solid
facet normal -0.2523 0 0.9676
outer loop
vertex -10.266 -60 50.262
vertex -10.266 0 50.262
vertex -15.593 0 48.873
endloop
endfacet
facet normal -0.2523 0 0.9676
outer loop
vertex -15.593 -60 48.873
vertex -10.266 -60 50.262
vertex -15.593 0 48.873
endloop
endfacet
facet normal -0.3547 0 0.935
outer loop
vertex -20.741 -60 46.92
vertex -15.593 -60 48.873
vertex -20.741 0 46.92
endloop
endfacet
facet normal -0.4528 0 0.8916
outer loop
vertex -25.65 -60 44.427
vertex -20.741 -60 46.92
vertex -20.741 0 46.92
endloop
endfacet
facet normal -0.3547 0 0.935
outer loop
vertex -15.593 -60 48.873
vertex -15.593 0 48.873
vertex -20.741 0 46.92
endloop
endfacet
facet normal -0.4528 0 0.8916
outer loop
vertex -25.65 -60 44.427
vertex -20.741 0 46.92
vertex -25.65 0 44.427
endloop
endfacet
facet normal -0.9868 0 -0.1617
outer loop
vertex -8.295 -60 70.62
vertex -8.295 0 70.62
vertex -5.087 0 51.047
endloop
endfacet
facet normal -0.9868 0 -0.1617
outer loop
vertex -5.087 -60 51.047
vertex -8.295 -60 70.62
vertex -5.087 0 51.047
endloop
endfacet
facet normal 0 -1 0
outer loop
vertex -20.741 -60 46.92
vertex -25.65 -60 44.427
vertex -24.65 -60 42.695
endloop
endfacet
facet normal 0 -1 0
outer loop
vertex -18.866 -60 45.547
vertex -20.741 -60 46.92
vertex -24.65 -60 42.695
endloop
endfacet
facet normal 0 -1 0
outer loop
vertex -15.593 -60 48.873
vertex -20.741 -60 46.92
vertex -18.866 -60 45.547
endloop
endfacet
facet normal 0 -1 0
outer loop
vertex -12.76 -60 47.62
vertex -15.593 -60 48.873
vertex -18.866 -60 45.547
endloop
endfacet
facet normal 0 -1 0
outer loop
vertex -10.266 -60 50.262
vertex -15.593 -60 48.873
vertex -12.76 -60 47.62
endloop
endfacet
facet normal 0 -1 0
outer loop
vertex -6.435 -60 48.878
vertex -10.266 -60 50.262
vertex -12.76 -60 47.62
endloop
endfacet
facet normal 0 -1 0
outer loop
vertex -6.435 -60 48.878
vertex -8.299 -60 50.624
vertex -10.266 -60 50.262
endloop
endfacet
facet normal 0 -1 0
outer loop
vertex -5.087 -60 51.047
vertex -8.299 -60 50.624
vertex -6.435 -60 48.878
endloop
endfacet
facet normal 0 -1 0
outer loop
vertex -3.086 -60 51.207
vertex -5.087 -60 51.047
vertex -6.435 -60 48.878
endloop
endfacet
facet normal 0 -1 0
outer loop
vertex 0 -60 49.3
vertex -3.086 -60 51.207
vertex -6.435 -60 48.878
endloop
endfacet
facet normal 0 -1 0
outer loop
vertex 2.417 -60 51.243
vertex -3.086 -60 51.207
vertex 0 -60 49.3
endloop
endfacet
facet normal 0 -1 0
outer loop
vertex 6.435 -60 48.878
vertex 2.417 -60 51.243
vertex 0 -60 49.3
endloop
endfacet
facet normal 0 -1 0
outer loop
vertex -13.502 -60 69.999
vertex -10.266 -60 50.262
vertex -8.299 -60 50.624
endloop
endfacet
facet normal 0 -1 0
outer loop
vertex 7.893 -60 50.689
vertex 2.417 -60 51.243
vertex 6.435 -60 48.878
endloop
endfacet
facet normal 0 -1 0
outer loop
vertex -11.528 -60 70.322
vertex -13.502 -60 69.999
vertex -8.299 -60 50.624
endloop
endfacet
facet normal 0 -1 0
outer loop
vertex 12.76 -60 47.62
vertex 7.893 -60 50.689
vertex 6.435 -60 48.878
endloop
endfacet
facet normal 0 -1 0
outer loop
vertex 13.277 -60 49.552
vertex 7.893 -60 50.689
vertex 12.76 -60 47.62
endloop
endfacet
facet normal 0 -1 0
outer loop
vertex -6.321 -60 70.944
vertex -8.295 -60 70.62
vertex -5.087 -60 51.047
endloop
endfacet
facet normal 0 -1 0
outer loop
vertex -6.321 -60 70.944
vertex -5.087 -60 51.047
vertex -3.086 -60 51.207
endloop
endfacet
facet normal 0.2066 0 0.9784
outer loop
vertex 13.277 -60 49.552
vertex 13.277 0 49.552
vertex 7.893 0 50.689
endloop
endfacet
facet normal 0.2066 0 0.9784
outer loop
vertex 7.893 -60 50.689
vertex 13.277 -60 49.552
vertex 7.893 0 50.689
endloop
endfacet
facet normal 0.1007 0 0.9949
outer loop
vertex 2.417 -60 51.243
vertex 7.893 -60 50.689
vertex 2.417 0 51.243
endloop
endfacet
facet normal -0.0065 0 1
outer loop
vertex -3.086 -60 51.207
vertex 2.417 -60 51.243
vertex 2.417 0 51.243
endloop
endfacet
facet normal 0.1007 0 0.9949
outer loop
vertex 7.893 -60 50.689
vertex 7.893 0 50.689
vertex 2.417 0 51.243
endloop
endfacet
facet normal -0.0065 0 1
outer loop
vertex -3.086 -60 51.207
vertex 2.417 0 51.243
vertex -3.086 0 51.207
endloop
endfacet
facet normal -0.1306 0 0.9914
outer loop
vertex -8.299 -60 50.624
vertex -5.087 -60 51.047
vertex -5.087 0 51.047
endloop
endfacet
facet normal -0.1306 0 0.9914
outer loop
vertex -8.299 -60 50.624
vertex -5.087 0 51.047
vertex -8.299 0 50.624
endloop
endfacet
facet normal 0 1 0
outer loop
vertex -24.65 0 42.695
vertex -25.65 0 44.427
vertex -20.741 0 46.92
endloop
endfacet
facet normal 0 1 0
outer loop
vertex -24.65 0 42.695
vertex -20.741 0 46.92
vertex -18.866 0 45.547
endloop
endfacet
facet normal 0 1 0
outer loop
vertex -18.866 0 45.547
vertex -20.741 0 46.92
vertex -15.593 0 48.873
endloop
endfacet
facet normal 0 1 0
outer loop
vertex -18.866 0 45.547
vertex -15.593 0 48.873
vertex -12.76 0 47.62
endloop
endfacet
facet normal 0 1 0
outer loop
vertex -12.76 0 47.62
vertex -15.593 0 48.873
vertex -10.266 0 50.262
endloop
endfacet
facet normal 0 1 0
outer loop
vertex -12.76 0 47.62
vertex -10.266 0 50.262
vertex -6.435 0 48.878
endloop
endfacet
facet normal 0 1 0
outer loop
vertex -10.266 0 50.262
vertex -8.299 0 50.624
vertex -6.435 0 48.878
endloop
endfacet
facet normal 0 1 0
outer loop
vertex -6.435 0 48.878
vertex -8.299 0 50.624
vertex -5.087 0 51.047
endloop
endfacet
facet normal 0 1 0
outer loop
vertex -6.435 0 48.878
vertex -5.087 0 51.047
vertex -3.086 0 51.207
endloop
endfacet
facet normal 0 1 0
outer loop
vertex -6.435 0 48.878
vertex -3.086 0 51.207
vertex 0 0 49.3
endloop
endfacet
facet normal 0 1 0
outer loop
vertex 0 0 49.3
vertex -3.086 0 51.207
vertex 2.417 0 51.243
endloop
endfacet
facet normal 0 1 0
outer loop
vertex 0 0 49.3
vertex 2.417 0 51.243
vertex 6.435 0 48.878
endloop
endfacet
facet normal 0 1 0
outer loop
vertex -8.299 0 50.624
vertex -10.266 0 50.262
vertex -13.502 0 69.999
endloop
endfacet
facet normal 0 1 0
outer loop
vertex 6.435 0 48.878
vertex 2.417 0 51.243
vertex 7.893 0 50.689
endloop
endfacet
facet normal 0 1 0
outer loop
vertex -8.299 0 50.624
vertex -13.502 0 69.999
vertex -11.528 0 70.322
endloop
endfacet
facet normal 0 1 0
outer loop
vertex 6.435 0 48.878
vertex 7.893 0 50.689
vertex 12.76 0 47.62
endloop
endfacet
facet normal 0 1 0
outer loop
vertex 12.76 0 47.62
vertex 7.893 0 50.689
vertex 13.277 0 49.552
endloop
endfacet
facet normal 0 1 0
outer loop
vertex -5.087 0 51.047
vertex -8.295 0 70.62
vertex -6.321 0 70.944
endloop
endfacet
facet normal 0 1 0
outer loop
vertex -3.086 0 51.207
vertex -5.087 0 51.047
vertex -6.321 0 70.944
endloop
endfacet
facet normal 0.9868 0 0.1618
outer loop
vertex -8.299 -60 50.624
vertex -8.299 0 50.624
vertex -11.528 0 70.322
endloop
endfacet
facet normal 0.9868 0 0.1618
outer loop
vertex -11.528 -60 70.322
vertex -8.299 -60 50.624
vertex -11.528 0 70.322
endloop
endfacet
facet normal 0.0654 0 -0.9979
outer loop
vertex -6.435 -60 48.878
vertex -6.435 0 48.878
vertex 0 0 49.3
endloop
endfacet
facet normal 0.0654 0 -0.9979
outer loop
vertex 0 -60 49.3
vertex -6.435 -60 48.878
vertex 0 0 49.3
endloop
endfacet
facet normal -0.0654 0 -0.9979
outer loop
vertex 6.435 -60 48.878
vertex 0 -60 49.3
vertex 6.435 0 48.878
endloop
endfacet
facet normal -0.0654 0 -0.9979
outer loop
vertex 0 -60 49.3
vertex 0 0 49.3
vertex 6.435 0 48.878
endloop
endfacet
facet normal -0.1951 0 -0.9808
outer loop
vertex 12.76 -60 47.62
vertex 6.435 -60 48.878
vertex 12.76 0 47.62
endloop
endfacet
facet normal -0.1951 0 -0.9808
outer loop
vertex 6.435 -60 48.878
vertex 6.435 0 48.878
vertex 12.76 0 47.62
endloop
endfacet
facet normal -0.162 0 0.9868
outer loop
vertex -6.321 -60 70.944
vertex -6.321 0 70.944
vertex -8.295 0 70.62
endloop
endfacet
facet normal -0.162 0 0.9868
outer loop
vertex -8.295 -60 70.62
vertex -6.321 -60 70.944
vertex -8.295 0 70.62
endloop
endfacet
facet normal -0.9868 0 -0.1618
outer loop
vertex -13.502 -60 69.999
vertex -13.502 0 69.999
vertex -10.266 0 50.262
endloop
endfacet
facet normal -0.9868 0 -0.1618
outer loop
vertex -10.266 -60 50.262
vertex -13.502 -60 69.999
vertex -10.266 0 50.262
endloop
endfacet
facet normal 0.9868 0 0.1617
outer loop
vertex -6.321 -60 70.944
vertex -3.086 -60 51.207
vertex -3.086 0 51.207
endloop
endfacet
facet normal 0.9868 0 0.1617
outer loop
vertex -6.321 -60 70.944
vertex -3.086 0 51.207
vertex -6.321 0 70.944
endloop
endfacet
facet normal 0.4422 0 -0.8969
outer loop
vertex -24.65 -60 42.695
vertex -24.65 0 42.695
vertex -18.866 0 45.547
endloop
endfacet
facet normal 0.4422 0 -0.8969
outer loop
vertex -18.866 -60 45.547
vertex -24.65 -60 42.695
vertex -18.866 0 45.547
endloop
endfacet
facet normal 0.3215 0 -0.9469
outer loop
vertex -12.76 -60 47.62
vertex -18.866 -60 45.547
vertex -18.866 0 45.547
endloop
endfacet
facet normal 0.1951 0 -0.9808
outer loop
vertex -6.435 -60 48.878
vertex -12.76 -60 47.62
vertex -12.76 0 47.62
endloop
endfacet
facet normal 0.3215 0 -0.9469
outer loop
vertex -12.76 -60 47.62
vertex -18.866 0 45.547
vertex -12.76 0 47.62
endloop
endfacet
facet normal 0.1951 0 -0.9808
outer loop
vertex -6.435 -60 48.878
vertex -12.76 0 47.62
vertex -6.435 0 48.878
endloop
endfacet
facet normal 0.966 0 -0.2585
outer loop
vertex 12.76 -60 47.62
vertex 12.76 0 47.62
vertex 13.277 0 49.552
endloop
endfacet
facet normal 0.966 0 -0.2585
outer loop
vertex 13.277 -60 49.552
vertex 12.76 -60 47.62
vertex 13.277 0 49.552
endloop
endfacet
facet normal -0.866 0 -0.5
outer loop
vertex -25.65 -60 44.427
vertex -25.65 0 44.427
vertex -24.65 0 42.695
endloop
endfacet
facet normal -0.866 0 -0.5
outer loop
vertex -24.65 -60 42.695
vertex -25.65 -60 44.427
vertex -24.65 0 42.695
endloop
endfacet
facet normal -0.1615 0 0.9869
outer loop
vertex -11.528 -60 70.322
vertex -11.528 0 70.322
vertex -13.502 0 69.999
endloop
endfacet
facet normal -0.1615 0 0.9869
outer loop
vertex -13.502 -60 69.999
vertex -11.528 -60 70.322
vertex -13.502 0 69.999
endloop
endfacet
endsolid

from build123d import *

# Parameters (mm, degrees)
F1_DEPTH = 60


with BuildPart() as f1:
    # F0 (on Front) → F1 (new body)
    with BuildSketch(Plane.XZ):
        with BuildLine():
            ThreePointArc((-6.434941, 48.878232), (3.224374, 49.194445), (12.759779, 47.620143))
            Line((12.759779, 47.620143), (13.277417, 49.551995))
            ThreePointArc((13.277417, 49.551995), (5.162454, 51.039583), (-3.086029, 51.207094))
            ThreePointArc((-3.086029, 51.207094), (-4.087053, 51.136934), (-5.086513, 51.047207))
            Line((-5.086513, 51.047207), (-6.692654, 50.835755))
            Line((-6.692654, 50.835755), (-6.434941, 48.878232))
        make_face()
        with BuildLine():
            Line((-13.50154, 69.998845), (-10.266143, 50.262275))
            ThreePointArc((-10.266143, 50.262275), (-9.284233, 50.452879), (-8.298795, 50.624303))
            Line((-8.298795, 50.624303), (-11.527883, 70.322385))
            Line((-11.527883, 70.322385), (-13.50154, 69.998845))
        make_face()
        with BuildLine():
            ThreePointArc((-5.086513, 51.047207), (-4.087053, 51.136934), (-3.086029, 51.207094))
            Line((-3.086029, 51.207094), (-6.321426, 70.943664))
            Line((-6.321426, 70.943664), (-8.295083, 70.620124))
            Line((-8.295083, 70.620124), (-5.086513, 51.047207))
        make_face()
        with BuildLine():
            Line((-25.65, 44.427103), (-24.65, 42.695052))
            ThreePointArc((-24.65, 42.695052), (-15.846966, 46.683655), (-6.434941, 48.878232))
            Line((-6.434941, 48.878232), (-6.692654, 50.835755))
            Line((-6.692654, 50.835755), (-8.298795, 50.624303))
            ThreePointArc((-8.298795, 50.624303), (-9.284233, 50.452879), (-10.266143, 50.262275))
            ThreePointArc((-10.266143, 50.262275), (-18.193533, 47.96546), (-25.65, 44.427103))
        make_face()
    extrude(amount=F1_DEPTH)


solid = f1.part
